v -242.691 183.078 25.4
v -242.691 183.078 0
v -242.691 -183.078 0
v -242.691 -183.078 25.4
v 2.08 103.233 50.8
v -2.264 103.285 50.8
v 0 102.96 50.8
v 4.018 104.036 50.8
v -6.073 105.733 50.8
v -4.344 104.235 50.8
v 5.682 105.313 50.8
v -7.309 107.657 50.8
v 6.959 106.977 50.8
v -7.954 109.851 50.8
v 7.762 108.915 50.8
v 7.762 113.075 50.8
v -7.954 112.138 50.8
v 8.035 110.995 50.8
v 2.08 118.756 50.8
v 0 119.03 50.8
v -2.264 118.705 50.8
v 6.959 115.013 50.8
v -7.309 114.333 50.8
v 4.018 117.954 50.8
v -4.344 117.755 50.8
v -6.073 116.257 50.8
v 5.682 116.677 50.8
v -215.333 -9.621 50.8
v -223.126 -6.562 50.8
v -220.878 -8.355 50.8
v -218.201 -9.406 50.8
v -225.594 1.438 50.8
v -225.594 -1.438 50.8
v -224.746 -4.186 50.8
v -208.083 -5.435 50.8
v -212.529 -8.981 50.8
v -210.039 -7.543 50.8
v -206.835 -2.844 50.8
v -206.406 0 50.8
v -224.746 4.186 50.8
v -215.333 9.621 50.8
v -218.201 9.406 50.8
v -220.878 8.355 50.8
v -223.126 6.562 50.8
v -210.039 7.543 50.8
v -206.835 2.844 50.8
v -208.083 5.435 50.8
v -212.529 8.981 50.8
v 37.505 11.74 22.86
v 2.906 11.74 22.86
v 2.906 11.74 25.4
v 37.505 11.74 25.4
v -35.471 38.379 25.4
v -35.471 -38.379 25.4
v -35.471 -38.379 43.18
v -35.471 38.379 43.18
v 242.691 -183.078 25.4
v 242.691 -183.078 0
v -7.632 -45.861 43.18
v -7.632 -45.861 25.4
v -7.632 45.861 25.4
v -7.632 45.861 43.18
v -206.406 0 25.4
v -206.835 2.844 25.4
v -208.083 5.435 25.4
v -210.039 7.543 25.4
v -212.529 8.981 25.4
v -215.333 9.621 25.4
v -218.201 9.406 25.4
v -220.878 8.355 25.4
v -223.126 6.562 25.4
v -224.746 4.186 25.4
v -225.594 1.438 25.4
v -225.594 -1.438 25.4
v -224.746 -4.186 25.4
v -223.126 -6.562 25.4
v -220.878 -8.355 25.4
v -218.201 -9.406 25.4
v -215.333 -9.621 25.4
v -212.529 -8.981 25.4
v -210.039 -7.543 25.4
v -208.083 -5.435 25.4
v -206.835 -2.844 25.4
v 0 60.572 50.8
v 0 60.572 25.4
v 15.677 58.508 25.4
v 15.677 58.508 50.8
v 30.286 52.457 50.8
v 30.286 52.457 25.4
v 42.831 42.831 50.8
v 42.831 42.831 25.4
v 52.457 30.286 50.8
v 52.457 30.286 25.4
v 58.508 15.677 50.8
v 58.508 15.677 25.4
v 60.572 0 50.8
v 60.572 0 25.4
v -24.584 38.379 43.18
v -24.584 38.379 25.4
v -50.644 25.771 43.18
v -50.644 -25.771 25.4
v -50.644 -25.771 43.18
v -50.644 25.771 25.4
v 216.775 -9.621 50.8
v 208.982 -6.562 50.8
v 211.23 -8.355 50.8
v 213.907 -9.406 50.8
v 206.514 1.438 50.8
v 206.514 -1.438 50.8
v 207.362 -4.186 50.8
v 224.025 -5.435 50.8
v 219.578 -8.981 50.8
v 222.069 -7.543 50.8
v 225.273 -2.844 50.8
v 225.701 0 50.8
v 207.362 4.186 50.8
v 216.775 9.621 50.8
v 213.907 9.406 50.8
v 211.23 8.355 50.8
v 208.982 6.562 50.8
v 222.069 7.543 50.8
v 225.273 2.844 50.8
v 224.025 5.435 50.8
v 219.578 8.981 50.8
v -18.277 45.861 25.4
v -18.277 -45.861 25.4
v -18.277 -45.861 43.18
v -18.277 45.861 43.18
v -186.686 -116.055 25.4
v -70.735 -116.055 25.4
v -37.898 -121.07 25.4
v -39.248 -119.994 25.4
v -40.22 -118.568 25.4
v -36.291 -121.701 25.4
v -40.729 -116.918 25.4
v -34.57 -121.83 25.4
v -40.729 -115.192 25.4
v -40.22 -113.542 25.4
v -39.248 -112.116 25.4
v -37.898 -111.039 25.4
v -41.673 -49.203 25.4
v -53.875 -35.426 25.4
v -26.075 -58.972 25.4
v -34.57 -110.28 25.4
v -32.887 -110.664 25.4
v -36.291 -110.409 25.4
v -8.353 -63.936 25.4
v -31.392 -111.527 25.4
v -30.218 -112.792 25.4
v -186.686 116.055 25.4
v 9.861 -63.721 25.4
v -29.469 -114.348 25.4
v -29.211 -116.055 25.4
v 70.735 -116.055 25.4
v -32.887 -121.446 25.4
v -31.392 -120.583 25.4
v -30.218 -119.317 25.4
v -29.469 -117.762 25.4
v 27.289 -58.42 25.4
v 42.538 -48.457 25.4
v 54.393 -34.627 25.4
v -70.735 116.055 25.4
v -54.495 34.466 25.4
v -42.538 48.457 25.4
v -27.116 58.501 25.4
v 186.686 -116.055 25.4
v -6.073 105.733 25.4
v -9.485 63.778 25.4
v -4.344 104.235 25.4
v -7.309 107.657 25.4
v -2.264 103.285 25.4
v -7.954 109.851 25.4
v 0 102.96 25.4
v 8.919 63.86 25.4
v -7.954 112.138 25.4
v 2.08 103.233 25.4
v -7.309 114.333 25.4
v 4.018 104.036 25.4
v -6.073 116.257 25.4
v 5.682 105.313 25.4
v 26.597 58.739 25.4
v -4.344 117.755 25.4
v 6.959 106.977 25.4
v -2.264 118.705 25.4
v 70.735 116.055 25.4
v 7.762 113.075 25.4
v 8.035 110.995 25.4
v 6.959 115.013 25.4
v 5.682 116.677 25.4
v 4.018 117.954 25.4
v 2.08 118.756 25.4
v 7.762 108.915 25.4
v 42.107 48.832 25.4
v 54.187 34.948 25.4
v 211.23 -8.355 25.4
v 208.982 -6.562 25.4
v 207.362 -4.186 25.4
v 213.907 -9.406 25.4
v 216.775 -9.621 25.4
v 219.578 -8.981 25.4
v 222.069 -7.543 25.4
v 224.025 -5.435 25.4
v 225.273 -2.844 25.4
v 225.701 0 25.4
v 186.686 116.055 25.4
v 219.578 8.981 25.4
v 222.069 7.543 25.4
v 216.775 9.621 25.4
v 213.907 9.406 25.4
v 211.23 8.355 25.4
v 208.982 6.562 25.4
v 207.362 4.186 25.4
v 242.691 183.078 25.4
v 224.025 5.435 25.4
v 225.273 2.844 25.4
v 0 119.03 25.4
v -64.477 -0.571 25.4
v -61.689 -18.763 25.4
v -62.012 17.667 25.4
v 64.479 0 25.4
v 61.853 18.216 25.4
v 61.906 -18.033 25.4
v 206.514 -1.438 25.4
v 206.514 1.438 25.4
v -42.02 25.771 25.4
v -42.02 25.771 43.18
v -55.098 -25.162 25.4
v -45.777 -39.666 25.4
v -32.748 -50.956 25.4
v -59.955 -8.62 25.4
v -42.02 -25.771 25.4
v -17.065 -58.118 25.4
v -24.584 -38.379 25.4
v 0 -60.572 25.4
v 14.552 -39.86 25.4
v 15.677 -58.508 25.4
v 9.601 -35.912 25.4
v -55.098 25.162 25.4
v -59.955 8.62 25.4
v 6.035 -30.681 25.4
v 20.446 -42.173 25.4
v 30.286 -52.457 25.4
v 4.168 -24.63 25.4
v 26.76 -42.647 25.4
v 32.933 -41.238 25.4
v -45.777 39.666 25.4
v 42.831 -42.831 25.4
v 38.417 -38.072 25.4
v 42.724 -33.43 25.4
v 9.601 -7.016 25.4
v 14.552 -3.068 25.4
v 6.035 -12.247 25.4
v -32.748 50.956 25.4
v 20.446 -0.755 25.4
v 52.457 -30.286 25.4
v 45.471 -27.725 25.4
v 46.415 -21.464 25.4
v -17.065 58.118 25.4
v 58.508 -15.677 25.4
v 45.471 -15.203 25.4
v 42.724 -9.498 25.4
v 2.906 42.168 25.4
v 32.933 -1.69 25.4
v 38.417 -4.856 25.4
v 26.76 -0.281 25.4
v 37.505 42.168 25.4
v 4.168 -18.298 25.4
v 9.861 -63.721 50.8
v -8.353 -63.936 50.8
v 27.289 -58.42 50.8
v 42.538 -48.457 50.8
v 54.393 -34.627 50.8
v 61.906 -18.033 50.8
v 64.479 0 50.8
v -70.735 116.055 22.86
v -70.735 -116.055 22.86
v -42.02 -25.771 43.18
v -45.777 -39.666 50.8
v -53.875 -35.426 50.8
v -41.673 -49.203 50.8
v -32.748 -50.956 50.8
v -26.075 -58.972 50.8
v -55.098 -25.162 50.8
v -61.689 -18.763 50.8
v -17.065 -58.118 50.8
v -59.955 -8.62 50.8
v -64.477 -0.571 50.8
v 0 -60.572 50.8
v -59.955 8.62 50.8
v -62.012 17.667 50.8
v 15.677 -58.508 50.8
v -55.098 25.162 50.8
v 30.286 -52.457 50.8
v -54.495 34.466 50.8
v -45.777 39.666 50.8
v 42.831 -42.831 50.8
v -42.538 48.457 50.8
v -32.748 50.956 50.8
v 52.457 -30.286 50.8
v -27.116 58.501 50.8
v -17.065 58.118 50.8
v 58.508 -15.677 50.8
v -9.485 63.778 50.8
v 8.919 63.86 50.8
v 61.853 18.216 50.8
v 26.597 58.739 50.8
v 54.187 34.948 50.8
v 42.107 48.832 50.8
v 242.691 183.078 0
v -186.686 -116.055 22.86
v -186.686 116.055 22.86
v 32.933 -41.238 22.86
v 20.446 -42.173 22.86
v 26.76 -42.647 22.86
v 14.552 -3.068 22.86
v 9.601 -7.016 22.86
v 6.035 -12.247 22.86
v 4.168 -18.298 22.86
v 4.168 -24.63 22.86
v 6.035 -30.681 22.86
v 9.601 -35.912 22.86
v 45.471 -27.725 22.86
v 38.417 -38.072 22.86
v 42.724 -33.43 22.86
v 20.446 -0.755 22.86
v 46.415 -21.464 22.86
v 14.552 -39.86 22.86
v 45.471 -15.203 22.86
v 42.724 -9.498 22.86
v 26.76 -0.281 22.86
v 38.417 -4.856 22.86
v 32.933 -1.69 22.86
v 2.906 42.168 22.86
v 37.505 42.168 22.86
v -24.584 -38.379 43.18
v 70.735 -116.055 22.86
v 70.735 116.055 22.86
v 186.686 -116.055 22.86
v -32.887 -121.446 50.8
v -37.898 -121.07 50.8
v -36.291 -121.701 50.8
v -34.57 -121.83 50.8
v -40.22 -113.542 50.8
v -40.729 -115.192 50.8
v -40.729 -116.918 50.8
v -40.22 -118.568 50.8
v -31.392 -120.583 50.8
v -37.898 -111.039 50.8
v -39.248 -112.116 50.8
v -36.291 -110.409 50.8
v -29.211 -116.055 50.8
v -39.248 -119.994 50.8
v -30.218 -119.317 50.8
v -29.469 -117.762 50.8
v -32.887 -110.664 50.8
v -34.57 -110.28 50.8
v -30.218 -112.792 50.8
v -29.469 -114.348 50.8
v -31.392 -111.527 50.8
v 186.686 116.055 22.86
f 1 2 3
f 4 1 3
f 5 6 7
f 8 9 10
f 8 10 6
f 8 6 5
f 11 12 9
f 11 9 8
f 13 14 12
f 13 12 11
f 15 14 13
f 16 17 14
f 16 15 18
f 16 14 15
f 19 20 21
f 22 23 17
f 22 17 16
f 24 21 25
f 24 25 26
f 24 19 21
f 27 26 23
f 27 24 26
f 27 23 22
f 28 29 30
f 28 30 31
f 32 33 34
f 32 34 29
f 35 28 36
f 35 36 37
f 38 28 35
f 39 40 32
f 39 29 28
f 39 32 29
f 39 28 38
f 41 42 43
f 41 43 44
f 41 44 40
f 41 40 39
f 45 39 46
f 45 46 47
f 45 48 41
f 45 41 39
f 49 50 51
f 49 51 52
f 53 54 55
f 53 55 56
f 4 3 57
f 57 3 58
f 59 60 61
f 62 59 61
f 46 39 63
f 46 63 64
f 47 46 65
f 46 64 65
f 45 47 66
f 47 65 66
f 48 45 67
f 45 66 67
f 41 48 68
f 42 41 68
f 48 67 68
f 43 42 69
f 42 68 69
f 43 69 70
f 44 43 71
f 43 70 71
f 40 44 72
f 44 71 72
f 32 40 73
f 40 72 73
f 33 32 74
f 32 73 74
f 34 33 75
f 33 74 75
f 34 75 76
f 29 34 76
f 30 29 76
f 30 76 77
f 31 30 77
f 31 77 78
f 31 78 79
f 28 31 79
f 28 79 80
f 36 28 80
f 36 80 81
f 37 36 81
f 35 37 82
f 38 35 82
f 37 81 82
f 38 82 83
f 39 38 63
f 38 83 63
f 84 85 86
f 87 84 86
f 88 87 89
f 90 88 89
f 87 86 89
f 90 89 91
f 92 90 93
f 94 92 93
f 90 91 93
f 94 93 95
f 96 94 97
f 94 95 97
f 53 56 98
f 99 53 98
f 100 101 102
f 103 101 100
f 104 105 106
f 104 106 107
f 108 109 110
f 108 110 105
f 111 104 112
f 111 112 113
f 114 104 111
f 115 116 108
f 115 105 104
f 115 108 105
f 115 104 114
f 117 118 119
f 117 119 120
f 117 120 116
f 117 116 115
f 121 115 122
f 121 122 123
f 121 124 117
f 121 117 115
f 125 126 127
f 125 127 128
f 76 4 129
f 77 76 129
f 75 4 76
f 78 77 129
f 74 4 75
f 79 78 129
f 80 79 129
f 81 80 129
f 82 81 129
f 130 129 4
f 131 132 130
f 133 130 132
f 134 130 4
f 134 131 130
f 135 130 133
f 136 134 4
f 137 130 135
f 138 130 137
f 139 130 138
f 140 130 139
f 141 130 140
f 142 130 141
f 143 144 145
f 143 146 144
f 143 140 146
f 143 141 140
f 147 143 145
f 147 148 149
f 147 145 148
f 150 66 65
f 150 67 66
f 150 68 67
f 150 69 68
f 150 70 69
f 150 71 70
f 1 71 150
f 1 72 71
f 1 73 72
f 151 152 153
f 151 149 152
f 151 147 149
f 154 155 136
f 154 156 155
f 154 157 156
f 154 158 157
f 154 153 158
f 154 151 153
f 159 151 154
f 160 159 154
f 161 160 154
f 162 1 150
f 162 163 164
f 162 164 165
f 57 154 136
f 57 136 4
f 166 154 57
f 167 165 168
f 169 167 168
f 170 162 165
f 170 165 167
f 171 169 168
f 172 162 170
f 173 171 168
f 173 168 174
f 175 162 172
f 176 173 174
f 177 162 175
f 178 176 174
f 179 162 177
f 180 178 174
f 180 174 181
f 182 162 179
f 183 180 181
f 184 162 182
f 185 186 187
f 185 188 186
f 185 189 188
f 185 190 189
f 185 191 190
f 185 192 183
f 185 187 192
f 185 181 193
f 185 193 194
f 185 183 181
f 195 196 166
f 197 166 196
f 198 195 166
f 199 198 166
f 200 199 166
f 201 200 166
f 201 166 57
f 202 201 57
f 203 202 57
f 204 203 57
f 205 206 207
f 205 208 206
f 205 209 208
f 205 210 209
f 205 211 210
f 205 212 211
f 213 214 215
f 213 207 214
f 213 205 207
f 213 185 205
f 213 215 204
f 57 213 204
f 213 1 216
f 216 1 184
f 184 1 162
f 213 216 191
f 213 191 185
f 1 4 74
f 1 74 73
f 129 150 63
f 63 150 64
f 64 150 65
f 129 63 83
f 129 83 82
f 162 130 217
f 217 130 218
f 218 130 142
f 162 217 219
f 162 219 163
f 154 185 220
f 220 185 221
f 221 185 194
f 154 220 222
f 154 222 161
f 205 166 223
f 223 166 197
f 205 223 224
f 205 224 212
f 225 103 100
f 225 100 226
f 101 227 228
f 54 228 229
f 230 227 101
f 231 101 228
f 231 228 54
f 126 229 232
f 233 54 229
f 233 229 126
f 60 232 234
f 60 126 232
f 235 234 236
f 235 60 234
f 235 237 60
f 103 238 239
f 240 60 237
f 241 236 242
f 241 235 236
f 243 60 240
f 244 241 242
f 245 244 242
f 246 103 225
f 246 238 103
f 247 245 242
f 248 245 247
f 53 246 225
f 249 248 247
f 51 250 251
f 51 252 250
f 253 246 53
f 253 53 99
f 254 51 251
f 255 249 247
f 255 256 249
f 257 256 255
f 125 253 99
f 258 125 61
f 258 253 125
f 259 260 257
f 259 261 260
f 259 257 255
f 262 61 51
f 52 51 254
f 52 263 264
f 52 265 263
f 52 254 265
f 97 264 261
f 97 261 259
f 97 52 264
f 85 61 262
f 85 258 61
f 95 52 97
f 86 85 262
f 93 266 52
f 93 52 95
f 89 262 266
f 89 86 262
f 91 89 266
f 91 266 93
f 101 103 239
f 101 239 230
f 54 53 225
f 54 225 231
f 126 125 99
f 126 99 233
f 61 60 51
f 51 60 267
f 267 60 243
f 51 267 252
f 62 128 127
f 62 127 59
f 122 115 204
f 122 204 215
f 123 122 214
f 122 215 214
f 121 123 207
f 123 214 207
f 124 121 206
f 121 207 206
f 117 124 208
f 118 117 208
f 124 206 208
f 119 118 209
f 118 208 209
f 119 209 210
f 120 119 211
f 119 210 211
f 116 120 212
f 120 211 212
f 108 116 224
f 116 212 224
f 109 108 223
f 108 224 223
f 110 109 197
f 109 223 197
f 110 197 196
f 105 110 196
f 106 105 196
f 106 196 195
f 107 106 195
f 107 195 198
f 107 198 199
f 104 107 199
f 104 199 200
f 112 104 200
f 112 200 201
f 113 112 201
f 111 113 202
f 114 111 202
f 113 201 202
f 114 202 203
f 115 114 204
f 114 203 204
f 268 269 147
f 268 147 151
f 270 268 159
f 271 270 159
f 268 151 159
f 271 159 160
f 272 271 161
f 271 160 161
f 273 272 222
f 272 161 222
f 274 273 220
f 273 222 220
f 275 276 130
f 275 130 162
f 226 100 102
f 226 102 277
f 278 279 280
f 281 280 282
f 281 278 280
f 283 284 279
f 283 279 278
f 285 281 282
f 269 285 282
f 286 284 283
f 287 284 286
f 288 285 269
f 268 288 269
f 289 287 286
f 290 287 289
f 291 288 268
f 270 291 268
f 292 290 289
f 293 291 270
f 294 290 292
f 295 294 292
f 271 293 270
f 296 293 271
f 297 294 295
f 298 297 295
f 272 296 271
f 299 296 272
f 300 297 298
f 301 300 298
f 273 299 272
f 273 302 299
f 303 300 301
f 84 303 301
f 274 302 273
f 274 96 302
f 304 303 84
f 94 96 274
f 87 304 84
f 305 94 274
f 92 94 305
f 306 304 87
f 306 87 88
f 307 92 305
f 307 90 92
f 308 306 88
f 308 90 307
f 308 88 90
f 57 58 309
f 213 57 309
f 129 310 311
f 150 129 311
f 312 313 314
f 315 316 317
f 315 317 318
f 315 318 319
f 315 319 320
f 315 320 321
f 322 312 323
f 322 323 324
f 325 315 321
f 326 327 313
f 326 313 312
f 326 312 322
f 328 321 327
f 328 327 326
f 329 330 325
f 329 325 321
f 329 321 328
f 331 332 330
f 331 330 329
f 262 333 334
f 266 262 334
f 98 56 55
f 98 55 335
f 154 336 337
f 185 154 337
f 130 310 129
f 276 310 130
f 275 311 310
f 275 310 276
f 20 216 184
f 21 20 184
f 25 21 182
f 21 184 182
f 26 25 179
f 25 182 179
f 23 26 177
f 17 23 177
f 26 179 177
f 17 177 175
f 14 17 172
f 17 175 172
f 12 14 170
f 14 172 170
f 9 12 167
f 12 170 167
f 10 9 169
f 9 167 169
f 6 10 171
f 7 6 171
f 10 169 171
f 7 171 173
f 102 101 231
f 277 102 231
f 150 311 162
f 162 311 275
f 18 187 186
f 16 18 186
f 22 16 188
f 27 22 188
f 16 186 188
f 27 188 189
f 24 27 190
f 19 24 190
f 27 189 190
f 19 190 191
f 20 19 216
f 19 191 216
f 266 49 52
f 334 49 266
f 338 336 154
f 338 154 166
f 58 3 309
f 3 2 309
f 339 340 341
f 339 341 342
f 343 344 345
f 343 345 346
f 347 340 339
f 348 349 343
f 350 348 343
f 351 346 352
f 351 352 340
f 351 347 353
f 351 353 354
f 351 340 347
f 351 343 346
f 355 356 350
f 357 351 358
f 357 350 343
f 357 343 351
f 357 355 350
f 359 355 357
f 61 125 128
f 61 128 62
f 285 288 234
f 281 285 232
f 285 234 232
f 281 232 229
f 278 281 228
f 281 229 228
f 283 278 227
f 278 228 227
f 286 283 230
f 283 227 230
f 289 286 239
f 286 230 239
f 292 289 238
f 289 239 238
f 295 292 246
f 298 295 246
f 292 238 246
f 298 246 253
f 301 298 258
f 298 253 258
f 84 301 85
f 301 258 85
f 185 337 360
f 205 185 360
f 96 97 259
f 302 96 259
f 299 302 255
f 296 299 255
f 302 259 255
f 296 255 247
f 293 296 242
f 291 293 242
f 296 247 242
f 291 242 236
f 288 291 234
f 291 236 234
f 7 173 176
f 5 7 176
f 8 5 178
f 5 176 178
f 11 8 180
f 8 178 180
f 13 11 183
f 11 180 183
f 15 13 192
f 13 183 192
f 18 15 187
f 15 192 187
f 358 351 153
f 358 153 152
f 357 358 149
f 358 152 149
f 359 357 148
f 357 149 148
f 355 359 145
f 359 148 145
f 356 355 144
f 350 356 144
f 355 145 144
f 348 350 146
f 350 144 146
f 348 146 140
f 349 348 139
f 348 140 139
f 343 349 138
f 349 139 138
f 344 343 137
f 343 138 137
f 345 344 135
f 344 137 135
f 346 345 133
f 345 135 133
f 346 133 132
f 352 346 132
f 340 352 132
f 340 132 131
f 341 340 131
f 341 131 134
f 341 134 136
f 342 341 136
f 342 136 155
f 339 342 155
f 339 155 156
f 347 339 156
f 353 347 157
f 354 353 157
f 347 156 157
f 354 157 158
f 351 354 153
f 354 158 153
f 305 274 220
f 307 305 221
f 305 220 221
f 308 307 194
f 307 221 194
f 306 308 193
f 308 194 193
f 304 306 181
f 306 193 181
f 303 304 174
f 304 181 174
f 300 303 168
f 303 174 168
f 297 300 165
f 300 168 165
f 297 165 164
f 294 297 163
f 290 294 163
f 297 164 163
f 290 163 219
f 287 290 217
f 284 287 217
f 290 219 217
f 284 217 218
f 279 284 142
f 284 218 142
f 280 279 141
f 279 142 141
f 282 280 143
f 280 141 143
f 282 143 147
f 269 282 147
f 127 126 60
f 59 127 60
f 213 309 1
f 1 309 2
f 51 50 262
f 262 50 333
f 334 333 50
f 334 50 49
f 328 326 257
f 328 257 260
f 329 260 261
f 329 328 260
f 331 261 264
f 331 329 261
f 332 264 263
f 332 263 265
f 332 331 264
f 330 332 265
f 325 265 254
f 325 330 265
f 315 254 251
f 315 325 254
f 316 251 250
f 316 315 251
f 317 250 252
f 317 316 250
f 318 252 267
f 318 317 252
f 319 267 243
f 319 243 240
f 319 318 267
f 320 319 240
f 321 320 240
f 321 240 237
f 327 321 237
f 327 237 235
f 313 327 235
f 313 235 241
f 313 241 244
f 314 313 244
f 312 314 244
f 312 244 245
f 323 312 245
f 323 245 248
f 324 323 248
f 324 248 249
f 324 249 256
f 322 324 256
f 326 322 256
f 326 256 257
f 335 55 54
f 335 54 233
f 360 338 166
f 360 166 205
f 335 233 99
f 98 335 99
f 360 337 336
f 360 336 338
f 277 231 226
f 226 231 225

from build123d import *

# Parameters (mm, degrees)
F0_W     = 115.9510612488
F0_H     = 232.1095168591
F1_DEPTH = 25.4
F2_DEPTH = 50.8
F0_W_2   = 8.6233839393
F0_H_2   = 51.5415742993
F0_W_3   = 10.8864195645
F0_H_3   = 76.7579004169
F0_W_4   = 10.6456745416
F0_H_4   = 91.7214006186
F0_R     = 21.2419727644
F0_W_5   = 34.5992818475
F0_H_5   = 30.4277390242
F3_DEPTH = 25.4
F4_DEPTH = 43.18
F5_DEPTH = 22.86
F6_R     = 9.647506056
F6_R_2   = 5.7913302068
F7_DEPTH = 25.4


with BuildPart() as f1:
    # F0 (on Top) → F1 (new body)
    with BuildSketch(Plane.XY):
        Polygon((-242.6905930042, -183.078199625), (0, -183.078199625), (242.6905930042, -183.078199625), (242.6905930042, 183.078199625), (-242.6905930042, 183.078199625), align=None)
        with Locations((-128.7101954222, 0)):
            Rectangle(F0_W, F0_H, mode=Mode.SUBTRACT)
        with BuildLine():
            ThreePointArc((-8.3529502331, -63.9360985563), (-42.5382359375, 48.4571455981), (64.479426767, 0))
            ThreePointArc((64.479426767, 0), (42.5382359375, -48.4571455981), (-8.3529502331, -63.9360985563))
        make_face(mode=Mode.SUBTRACT)
        with Locations((128.7101954222, 0)):
            Rectangle(F0_W, F0_H, mode=Mode.SUBTRACT)
    extrude(amount=F1_DEPTH)

    # F0 (on Top) → F2 (join)
    with BuildSketch(Plane.XY):
        with BuildLine():
            ThreePointArc((-8.3529502331, -63.9360985563), (42.5382359375, -48.4571455981), (64.479426767, 0))
            ThreePointArc((64.479426767, 0), (-42.5382359375, 48.4571455981), (-8.3529502331, -63.9360985563))
        make_face()
        with BuildLine():
            ThreePointArc((0, 60.5718467831), (42.8307636094, 42.8307636094), (60.5718467831, 0))
            ThreePointArc((60.5718467831, 0), (42.8307636094, -42.8307636094), (0, -60.5718467831))
            ThreePointArc((0, -60.5718467831), (-60.5718467831, 0), (0, 60.5718467831))
        make_face(mode=Mode.SUBTRACT)
    extrude(amount=F2_DEPTH)

    # F0 (on Top) → F3 (join)
    with BuildSketch(Plane.XY):
        with BuildLine():
            Line((0, -60.5718467831), (0, 60.5718467831))
            ThreePointArc((0, 60.5718467831), (-60.5718467831, 0), (0, -60.5718467831))
        make_face()
        with Locations((-46.3319979608, 0)):
            Rectangle(F0_W_2, F0_H_2, mode=Mode.SUBTRACT)
        with Locations((-30.0273634493, 0)):
            Rectangle(F0_W_3, F0_H_3, mode=Mode.SUBTRACT)
        with Locations((-12.9544232041, 0)):
            Rectangle(F0_W_4, F0_H_4, mode=Mode.SUBTRACT)
        with BuildLine():
            ThreePointArc((0, -60.5718467831), (42.8307636094, -42.8307636094), (60.5718467831, 0))
            ThreePointArc((60.5718467831, 0), (42.8307636094, 42.8307636094), (0, 60.5718467831))
            Line((0, 60.5718467831), (0, -60.5718467831))
        make_face()
        with Locations((25.1728594303, -21.464029327)):
            Circle(F0_R, mode=Mode.SUBTRACT)
        with Locations((20.2057100832, 26.9539654255)):
            Rectangle(F0_W_5, F0_H_5, mode=Mode.SUBTRACT)
    extrude(amount=F3_DEPTH)

    # F0 (on Top) → F4 (join)
    with BuildSketch(Plane.XY):
        with Locations((-46.3319979608, 0)):
            Rectangle(F0_W_2, F0_H_2)
        with Locations((-30.0273634493, 0)):
            Rectangle(F0_W_3, F0_H_3)
        with Locations((-12.9544232041, 0)):
            Rectangle(F0_W_4, F0_H_4)
    extrude(amount=F4_DEPTH)

    # F0 (on Top) → F5 (join)
    with BuildSketch(Plane.XY):
        with Locations((-128.7101954222, 0)):
            Rectangle(F0_W, F0_H)
        with Locations((20.2057100832, 26.9539654255)):
            Rectangle(F0_W_5, F0_H_5)
        with Locations((25.1728594303, -21.464029327)):
            Circle(F0_R)
        with Locations((128.7101954222, 0)):
            Rectangle(F0_W, F0_H)
    extrude(amount=F5_DEPTH)

    # F6 (on face) → F7 (join)
    with BuildSketch(Plane.XY.offset(25.4)):
        with Locations((-216.0538285971, 0)):
            Circle(F6_R)
        with Locations((-35.002566874, -116.0547584295)):
            Circle(F6_R_2)
        with BuildLine():
            Line((0, 102.9595498758), (0, 119.0302903933))
            ThreePointArc((0, 119.0302903933), (-8.0353702587, 110.9949201345), (0, 102.9595498758))
        make_face()
        with BuildLine():
            ThreePointArc((0, 102.9595498758), (5.6818647993, 105.3130553353), (8.0353702587, 110.9949201345))
            ThreePointArc((8.0353702587, 110.9949201345), (5.6818647993, 116.6767849338), (0, 119.0302903933))
            Line((0, 119.0302903933), (0, 102.9595498758))
        make_face()
        with Locations((216.0538285971, 0)):
            Circle(F6_R)
    extrude(amount=F7_DEPTH)


solid = f1.part
